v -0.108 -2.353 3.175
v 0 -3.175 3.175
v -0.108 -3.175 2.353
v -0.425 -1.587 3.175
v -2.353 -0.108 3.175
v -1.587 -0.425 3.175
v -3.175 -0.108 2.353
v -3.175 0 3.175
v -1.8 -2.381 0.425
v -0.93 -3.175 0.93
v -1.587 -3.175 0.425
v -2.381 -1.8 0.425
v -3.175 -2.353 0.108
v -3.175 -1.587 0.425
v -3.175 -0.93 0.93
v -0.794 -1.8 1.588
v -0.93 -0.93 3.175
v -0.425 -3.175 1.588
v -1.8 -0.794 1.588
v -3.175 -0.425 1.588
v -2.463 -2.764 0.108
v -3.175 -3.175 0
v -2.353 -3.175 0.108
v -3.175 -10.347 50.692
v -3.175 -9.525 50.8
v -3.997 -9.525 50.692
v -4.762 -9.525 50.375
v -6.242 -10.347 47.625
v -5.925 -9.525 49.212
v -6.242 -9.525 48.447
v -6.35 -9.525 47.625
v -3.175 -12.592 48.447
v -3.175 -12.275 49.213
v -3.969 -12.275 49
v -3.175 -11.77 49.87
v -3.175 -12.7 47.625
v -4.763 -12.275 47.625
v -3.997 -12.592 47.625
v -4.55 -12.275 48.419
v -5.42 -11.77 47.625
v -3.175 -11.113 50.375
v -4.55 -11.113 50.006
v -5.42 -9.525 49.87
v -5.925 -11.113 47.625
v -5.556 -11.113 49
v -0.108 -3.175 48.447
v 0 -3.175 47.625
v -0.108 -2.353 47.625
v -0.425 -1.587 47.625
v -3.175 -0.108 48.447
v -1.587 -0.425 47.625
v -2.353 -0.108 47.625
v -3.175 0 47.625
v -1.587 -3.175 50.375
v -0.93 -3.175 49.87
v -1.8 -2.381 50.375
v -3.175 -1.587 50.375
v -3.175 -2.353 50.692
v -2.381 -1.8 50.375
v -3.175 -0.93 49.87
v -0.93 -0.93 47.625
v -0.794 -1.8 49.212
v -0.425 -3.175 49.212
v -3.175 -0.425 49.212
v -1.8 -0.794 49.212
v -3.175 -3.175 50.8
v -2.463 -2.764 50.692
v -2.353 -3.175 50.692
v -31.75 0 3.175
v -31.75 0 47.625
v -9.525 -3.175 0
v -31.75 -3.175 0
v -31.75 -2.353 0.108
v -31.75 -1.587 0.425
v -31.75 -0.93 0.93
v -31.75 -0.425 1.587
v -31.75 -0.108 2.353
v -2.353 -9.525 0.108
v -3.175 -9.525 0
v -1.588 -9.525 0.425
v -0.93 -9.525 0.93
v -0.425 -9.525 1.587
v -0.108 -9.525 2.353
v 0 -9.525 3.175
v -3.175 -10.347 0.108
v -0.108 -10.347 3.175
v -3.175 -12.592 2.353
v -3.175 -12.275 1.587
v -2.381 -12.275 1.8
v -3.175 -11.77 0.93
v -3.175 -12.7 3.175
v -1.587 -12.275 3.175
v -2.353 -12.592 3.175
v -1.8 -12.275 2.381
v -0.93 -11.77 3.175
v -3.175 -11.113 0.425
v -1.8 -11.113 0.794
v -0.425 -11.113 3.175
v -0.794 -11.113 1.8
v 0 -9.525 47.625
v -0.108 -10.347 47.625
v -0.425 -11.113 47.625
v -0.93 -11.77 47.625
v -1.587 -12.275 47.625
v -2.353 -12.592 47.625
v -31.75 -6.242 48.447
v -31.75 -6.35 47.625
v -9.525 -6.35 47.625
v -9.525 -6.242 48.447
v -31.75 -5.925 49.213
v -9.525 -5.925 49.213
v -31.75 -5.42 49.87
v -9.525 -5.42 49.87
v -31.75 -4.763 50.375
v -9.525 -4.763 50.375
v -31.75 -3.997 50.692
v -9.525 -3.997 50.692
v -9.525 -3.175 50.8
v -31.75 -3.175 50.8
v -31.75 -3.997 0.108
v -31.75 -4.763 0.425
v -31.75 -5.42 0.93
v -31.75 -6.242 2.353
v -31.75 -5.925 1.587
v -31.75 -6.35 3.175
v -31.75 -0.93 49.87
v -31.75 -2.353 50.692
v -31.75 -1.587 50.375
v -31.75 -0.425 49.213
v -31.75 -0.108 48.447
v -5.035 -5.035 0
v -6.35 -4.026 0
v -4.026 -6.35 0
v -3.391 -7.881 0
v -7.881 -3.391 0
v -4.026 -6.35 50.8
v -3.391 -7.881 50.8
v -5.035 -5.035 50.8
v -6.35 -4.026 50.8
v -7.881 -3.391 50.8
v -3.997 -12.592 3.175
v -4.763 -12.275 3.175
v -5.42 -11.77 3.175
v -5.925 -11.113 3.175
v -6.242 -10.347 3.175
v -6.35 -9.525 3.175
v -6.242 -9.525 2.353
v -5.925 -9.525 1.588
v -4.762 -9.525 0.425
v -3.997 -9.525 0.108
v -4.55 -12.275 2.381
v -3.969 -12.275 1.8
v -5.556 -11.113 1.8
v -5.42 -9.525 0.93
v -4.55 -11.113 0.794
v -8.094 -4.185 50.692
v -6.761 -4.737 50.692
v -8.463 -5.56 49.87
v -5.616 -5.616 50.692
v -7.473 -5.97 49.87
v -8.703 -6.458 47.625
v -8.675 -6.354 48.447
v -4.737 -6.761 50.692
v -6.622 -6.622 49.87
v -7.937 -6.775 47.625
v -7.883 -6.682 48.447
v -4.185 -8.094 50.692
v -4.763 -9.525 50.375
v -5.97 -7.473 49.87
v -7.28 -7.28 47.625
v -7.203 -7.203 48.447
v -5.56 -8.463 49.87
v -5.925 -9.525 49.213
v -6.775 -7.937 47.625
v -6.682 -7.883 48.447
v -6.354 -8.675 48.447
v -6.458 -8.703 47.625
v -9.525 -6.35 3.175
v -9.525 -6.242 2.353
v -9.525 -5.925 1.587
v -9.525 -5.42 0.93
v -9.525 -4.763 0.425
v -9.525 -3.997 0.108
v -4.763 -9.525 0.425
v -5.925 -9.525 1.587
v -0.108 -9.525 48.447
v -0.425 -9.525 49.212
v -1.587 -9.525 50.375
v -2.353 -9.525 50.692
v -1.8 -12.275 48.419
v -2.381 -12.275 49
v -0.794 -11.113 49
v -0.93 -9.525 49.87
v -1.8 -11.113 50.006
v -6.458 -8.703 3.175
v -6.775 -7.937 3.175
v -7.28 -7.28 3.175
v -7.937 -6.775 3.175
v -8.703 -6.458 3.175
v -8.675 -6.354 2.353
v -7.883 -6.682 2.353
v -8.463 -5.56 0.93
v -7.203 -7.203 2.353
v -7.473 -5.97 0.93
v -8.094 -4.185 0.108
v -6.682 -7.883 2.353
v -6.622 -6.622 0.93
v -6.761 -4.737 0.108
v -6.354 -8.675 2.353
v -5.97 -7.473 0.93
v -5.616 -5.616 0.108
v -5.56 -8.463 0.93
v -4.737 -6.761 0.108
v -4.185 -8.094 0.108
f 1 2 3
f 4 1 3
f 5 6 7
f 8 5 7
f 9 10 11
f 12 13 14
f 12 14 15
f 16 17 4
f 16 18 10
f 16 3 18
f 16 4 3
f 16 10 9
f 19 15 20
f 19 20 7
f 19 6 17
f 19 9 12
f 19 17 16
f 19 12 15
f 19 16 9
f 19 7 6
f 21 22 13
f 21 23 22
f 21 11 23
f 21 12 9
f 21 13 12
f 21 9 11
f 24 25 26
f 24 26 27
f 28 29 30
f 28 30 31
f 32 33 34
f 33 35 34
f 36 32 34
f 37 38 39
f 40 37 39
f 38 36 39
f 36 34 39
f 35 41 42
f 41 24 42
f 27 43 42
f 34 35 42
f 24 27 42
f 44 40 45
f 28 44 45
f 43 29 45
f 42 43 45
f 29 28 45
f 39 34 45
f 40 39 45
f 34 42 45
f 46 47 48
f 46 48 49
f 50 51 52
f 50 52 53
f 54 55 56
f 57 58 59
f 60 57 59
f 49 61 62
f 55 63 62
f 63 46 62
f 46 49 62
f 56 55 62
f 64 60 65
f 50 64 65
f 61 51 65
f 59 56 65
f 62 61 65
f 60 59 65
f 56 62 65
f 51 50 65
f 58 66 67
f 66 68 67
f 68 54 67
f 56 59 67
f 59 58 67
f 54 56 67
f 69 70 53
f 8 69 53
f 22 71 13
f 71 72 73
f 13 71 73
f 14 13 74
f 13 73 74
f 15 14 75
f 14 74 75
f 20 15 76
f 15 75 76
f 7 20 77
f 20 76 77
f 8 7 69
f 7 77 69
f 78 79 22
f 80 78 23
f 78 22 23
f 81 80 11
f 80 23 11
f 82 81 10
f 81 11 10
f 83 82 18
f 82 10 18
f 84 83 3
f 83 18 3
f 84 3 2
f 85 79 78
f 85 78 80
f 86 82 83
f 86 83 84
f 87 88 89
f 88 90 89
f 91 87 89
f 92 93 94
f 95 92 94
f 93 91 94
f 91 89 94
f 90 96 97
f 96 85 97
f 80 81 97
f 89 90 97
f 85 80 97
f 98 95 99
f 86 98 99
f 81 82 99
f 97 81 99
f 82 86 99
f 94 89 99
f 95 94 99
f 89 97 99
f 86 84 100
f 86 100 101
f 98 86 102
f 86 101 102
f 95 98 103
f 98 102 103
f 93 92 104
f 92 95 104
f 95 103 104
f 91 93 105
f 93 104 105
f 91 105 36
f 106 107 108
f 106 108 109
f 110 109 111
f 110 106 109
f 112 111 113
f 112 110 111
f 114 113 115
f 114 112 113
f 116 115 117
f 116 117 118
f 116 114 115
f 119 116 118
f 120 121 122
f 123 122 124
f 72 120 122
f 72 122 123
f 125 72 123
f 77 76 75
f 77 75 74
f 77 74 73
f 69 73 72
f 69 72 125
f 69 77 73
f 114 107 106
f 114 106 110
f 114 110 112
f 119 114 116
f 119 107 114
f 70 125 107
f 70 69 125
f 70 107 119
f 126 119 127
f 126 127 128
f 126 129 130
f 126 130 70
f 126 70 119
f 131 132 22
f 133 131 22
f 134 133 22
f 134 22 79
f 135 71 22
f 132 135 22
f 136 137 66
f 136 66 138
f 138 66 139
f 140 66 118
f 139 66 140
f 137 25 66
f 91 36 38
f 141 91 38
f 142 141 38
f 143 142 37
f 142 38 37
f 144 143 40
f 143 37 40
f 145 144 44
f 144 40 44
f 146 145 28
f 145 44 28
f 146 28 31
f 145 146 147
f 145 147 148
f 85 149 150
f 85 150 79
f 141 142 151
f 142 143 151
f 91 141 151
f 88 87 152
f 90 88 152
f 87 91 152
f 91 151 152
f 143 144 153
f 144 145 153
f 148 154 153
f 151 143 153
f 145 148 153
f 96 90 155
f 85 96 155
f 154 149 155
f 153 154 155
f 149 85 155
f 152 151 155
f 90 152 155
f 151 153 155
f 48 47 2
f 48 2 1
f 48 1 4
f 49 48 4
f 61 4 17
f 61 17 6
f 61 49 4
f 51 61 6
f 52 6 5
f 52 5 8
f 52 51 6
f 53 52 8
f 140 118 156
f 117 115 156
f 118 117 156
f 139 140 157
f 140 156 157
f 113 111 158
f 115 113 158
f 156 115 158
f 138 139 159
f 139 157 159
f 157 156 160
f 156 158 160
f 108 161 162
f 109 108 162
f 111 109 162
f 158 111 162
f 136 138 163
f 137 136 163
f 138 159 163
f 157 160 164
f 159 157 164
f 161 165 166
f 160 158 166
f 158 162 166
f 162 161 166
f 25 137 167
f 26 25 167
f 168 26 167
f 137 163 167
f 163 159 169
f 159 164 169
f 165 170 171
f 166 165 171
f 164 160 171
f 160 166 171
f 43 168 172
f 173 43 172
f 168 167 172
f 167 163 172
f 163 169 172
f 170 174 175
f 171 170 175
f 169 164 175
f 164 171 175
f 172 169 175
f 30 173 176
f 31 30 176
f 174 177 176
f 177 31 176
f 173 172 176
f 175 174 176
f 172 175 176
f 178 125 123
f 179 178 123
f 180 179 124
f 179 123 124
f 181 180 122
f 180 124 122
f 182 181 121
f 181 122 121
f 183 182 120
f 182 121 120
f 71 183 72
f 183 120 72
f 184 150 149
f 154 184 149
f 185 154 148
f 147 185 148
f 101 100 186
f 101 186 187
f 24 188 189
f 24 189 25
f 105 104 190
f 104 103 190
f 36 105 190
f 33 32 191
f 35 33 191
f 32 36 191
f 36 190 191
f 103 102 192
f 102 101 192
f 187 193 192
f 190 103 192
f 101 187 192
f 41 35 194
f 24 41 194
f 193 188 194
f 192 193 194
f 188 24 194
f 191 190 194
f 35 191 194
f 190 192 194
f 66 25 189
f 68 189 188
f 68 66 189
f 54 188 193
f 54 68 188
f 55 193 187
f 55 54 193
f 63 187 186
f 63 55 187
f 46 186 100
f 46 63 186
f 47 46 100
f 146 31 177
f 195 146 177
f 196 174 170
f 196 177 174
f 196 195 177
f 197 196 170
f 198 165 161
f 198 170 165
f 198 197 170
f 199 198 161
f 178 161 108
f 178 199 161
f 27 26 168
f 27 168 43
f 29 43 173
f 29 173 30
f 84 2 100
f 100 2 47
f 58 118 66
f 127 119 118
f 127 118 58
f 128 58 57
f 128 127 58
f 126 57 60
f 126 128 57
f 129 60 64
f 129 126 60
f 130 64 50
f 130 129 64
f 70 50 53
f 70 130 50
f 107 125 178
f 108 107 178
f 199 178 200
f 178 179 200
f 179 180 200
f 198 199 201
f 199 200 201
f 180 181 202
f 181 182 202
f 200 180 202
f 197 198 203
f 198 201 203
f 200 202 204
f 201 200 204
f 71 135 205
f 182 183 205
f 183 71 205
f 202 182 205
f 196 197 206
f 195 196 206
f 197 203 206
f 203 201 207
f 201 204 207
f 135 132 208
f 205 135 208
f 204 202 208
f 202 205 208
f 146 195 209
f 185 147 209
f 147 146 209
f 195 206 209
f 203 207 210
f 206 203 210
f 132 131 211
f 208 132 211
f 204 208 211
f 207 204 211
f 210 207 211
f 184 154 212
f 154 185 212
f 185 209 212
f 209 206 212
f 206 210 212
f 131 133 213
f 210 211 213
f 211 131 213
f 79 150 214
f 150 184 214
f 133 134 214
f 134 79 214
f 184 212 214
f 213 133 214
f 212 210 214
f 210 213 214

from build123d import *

# Parameters (mm, degrees)
F0_W         = 25.4
F0_H         = 50.8
F0_W_2       = 6.35
F1_DEPTH     = 6.35
F2_DEPTH     = 12.7
F3_R         = 3.17499
F4_T1_DEPTH  = 30.16251
F4_T3_DEPTH  = 44.45001
F4_T5_DEPTH  = 17.46251
F4_T7_DEPTH  = 3.17501
F4_T10_ANGLE = 90
F4_T12_ANGLE = 90
F4_T14_ANGLE = 90
F4_T16_ANGLE = 90
F4_T18_ANGLE = 90
F4_T20_ANGLE = 90
F4_T22_ANGLE = 90
F4_T24_ANGLE = 90


# Not quite as in the source:
# - a fillet or chamfer that OpenCascade refuses, or shapes differently, is made with other operations: its cross-section is extruded or revolved along the edge and cut away or added
# - a fillet or chamfer is up to 0.001 mm smaller than in the source, because OpenCascade refuses the exact size


with BuildPart() as f1:
    # F0 (on Front) → F1 (new body)
    with BuildSketch(Plane.XZ):
        with Locations((-19.05, 25.4)):
            Rectangle(F0_W, F0_H)
        with Locations((-3.175, 25.4)):
            Rectangle(F0_W_2, F0_H)
    extrude(amount=F1_DEPTH)

    # F0 (on Front) → F2 (join)
    with BuildSketch(Plane.XZ):
        with Locations((-3.175, 25.4)):
            Rectangle(F0_W_2, F0_H)
    extrude(amount=F2_DEPTH)

    # F3 (radius 3.175 in the source; OpenCascade refuses exactly that, so slightly less here)
    f3_edges = [f1.edges().sort_by_distance(p)[0] for p in [
        (0, 0, 25.4),
        (-6.35, -6.35, 25.4),
        (-3.175, -12.7, 0),
        (0, -12.7, 25.4),
        (-3.175, -12.7, 50.8),
        (-6.35, -12.7, 25.4),
    ]]
    fillet(f3_edges, radius=F3_R)

    # F4: fillet of radius 3.175 on 4 edges, made by hand

    # F4_s2 → F4_t1 (cut)
    with BuildSketch(Plane.YZ.offset(-39.6875)):
        with BuildLine():
            ThreePointArc((-6.35, 47.625), (-5.4200640303, 49.8700640303), (-3.175, 50.8))
            Line((-3.175, 50.8), (-6.35, 50.8))
            Line((-6.35, 50.8), (-6.35, 47.625))
        make_face()
        with BuildLine():
            ThreePointArc((-6.35, 3.175), (-5.4200640303, 0.9299359697), (-3.175, 0))
            Line((-3.175, 0), (-6.35, 0))
            Line((-6.35, 0), (-6.35, 3.175))
        make_face()
    extrude(amount=F4_T1_DEPTH, mode=Mode.SUBTRACT)

    # F4_s4 → F4_t3 (cut)
    with BuildSketch(Plane.YZ.offset(-39.6875)):
        with BuildLine():
            ThreePointArc((-3.175, 0), (-0.9299359697, 0.9299359697), (0, 3.175))
            Line((0, 3.175), (0, 0))
            Line((0, 0), (-3.175, 0))
        make_face()
        with BuildLine():
            ThreePointArc((-3.175, 50.8), (-0.9299359697, 49.8700640303), (0, 47.625))
            Line((0, 47.625), (0, 50.8))
            Line((0, 50.8), (-3.175, 50.8))
        make_face()
    extrude(amount=F4_T3_DEPTH, mode=Mode.SUBTRACT)

    # F4_s6 → F4_t5 (cut)
    with BuildSketch(Plane.XZ.offset(-4.76251)):
        with BuildLine():
            ThreePointArc((-3.175, 50.8), (-0.9299359697, 49.8700640303), (0, 47.625))
            Line((0, 47.625), (0, 50.8))
            Line((0, 50.8), (-3.175, 50.8))
        make_face()
        with BuildLine():
            ThreePointArc((-3.175, 0), (-0.9299359697, 0.9299359697), (0, 3.175))
            Line((0, 3.175), (0, 0))
            Line((0, 0), (-3.175, 0))
        make_face()
    extrude(amount=F4_T5_DEPTH, mode=Mode.SUBTRACT)

    # F4_s8 → F4_t7 (cut)
    with BuildSketch(Plane.XZ.offset(9.52499)):
        with BuildLine():
            ThreePointArc((-3.175, 0), (-5.4200640303, 0.9299359697), (-6.35, 3.175))
            Line((-6.35, 3.175), (-6.35, 0))
            Line((-6.35, 0), (-3.175, 0))
        make_face()
        with BuildLine():
            ThreePointArc((-3.175, 50.8), (-5.4200640303, 49.8700640303), (-6.35, 47.625))
            Line((-6.35, 47.625), (-6.35, 50.8))
            Line((-6.35, 50.8), (-3.175, 50.8))
        make_face()
    extrude(amount=F4_T7_DEPTH, mode=Mode.SUBTRACT)

    # F4_s9 → F4_t10 (revolve, cut)
    with BuildSketch(Plane.XY.offset(47.625)):
        with BuildLine():
            ThreePointArc((-3.17499, -12.7), (-0.9299330408, -11.7700669592), (0, -9.52501))
            Line((0, -9.52501), (0, -12.7))
            Line((0, -12.7), (-3.17499, -12.7))
        make_face()
    revolve(axis=Axis((-3.175, -12.7, 47.625), (0, -1, 0)), revolution_arc=F4_T10_ANGLE, mode=Mode.SUBTRACT)

    # F4_s11 → F4_t12 (revolve, cut)
    with BuildSketch(Plane.YZ.offset(-3.175)):
        with BuildLine():
            ThreePointArc((-12.7, 3.17499), (-11.7700669592, 0.9299330408), (-9.52501, 0))
            Line((-9.52501, 0), (-12.7, 0))
            Line((-12.7, 0), (-12.7, 3.17499))
        make_face()
    revolve(axis=Axis((-3.175, -12.7, 3.175), (0, -1, 0)), revolution_arc=F4_T12_ANGLE, mode=Mode.SUBTRACT)

    # F4_s13 → F4_t14 (revolve, cut)
    with BuildSketch(Plane.XY.offset(3.175)):
        with BuildLine():
            ThreePointArc((-3.17501, -12.7), (-5.4200669592, -11.7700669592), (-6.35, -9.52501))
            Line((-6.35, -9.52501), (-6.35, -12.7))
            Line((-6.35, -12.7), (-3.17501, -12.7))
        make_face()
    revolve(axis=Axis((-3.175, -12.7, 3.175), (0, -1, 0)), revolution_arc=F4_T14_ANGLE, mode=Mode.SUBTRACT)

    # F4_s15 → F4_t16 (revolve, cut)
    with BuildSketch(Plane.YZ.offset(-3.175)):
        with BuildLine():
            ThreePointArc((-12.7, 47.62501), (-11.7700669592, 49.8700669592), (-9.52501, 50.8))
            Line((-9.52501, 50.8), (-12.7, 50.8))
            Line((-12.7, 50.8), (-12.7, 47.62501))
        make_face()
    revolve(axis=Axis((-3.175, -12.7, 47.625), (0, -1, 0)), revolution_arc=F4_T16_ANGLE, mode=Mode.SUBTRACT)

    # F4_s17 → F4_t18 (revolve, cut)
    with BuildSketch(Plane.XZ.offset(3.17499)):
        with BuildLine():
            ThreePointArc((-3.17499, 50.8), (-0.9299324342, 49.8700604947), (0, 47.625))
            Line((0, 47.625), (0, 50.8))
            Line((0, 50.8), (-3.17499, 50.8))
        make_face()
    revolve(axis=Axis((-3.17499, -3.17499, 50.8), (0, 0, 1)), revolution_arc=F4_T18_ANGLE, mode=Mode.SUBTRACT)

    # F4_s19 → F4_t20 (revolve, cut)
    with BuildSketch(Plane.XZ.offset(3.17499)):
        with BuildLine():
            ThreePointArc((-3.17499, 0), (-0.9299324342, 0.9299395053), (0, 3.175))
            Line((0, 3.175), (0, 0))
            Line((0, 0), (-3.17499, 0))
        make_face()
    revolve(axis=Axis((-3.17499, -3.17499, 0), (0, 0, 1)), revolution_arc=F4_T20_ANGLE, mode=Mode.SUBTRACT)

    # F4_s21 → F4_t22 (revolve, cut)
    with BuildSketch(Plane.YZ.offset(-9.52499)):
        with BuildLine():
            ThreePointArc((-6.35, 3.175), (-5.4200640303, 0.9299359697), (-3.175, 0))
            Line((-3.175, 0), (-6.35, 0))
            Line((-6.35, 0), (-6.35, 3.175))
        make_face()
    revolve(axis=Axis((-9.52499, -9.52499, 0), (0, 0, -1)), revolution_arc=F4_T22_ANGLE, mode=Mode.SUBTRACT)

    # F4_s23 → F4_t24 (revolve, cut)
    with BuildSketch(Plane.YZ.offset(-9.52499)):
        with BuildLine():
            ThreePointArc((-3.175, 50.8), (-5.4200640303, 49.8700640303), (-6.35, 47.625))
            Line((-6.35, 47.625), (-6.35, 50.8))
            Line((-6.35, 50.8), (-3.175, 50.8))
        make_face()
    revolve(axis=Axis((-9.52499, -9.52499, 50.8), (0, 0, -1)), revolution_arc=F4_T24_ANGLE, mode=Mode.SUBTRACT)


solid = f1.part
